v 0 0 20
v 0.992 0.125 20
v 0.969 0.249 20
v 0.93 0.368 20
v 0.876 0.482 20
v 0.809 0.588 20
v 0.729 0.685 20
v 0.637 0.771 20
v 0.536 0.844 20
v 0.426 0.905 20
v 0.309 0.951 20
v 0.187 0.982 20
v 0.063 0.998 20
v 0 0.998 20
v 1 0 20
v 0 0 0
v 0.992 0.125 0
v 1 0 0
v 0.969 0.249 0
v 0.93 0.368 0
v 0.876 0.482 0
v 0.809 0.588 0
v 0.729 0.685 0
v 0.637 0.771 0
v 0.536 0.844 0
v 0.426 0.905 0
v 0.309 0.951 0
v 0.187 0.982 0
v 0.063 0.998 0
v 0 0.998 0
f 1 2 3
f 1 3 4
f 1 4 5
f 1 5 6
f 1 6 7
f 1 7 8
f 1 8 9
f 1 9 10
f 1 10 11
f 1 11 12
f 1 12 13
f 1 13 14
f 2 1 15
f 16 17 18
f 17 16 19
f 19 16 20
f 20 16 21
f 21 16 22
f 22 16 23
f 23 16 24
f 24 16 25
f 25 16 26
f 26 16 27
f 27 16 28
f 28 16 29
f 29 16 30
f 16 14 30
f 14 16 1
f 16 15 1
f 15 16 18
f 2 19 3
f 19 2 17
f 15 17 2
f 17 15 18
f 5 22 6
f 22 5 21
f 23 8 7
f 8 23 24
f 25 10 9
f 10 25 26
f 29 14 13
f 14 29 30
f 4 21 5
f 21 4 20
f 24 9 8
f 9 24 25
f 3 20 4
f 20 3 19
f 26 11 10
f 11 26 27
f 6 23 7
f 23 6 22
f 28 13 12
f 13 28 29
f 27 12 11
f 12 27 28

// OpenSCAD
cornerStyle(fillet=1);

module cornerStyle(h=20,fillet=0,chamfer=[0,0],internal=true,$fn=50){
    assert(!(fillet>0 && (chamfer.x > 0 || chamfer.y > 0)) ,"chamfer or fillet must not BOTH be used");
    assert(!(fillet==0 && (chamfer.x==0 || chamfer.y==0)),"fillet or chamfer values must be entered");
    $fn=$fn;
    if(fillet>0){
        if(internal)
        intersection(){
            cube([fillet,fillet,h]);
            cylinder(r=fillet,h=h);
        }
        else
        difference(){
            cube([fillet,fillet,h]);
            translate([0,0,-0.05])cylinder(r=fillet,h=h+0.1);
        }
    }
    else{
        path=[
        [0,0],
        [chamfer.x,0],
        [0,chamfer.y]
       ];
        linear_extrude(h)polygon([[0,0],[chamfer.x,0],[0,chamfer.y]]);
    }
}
